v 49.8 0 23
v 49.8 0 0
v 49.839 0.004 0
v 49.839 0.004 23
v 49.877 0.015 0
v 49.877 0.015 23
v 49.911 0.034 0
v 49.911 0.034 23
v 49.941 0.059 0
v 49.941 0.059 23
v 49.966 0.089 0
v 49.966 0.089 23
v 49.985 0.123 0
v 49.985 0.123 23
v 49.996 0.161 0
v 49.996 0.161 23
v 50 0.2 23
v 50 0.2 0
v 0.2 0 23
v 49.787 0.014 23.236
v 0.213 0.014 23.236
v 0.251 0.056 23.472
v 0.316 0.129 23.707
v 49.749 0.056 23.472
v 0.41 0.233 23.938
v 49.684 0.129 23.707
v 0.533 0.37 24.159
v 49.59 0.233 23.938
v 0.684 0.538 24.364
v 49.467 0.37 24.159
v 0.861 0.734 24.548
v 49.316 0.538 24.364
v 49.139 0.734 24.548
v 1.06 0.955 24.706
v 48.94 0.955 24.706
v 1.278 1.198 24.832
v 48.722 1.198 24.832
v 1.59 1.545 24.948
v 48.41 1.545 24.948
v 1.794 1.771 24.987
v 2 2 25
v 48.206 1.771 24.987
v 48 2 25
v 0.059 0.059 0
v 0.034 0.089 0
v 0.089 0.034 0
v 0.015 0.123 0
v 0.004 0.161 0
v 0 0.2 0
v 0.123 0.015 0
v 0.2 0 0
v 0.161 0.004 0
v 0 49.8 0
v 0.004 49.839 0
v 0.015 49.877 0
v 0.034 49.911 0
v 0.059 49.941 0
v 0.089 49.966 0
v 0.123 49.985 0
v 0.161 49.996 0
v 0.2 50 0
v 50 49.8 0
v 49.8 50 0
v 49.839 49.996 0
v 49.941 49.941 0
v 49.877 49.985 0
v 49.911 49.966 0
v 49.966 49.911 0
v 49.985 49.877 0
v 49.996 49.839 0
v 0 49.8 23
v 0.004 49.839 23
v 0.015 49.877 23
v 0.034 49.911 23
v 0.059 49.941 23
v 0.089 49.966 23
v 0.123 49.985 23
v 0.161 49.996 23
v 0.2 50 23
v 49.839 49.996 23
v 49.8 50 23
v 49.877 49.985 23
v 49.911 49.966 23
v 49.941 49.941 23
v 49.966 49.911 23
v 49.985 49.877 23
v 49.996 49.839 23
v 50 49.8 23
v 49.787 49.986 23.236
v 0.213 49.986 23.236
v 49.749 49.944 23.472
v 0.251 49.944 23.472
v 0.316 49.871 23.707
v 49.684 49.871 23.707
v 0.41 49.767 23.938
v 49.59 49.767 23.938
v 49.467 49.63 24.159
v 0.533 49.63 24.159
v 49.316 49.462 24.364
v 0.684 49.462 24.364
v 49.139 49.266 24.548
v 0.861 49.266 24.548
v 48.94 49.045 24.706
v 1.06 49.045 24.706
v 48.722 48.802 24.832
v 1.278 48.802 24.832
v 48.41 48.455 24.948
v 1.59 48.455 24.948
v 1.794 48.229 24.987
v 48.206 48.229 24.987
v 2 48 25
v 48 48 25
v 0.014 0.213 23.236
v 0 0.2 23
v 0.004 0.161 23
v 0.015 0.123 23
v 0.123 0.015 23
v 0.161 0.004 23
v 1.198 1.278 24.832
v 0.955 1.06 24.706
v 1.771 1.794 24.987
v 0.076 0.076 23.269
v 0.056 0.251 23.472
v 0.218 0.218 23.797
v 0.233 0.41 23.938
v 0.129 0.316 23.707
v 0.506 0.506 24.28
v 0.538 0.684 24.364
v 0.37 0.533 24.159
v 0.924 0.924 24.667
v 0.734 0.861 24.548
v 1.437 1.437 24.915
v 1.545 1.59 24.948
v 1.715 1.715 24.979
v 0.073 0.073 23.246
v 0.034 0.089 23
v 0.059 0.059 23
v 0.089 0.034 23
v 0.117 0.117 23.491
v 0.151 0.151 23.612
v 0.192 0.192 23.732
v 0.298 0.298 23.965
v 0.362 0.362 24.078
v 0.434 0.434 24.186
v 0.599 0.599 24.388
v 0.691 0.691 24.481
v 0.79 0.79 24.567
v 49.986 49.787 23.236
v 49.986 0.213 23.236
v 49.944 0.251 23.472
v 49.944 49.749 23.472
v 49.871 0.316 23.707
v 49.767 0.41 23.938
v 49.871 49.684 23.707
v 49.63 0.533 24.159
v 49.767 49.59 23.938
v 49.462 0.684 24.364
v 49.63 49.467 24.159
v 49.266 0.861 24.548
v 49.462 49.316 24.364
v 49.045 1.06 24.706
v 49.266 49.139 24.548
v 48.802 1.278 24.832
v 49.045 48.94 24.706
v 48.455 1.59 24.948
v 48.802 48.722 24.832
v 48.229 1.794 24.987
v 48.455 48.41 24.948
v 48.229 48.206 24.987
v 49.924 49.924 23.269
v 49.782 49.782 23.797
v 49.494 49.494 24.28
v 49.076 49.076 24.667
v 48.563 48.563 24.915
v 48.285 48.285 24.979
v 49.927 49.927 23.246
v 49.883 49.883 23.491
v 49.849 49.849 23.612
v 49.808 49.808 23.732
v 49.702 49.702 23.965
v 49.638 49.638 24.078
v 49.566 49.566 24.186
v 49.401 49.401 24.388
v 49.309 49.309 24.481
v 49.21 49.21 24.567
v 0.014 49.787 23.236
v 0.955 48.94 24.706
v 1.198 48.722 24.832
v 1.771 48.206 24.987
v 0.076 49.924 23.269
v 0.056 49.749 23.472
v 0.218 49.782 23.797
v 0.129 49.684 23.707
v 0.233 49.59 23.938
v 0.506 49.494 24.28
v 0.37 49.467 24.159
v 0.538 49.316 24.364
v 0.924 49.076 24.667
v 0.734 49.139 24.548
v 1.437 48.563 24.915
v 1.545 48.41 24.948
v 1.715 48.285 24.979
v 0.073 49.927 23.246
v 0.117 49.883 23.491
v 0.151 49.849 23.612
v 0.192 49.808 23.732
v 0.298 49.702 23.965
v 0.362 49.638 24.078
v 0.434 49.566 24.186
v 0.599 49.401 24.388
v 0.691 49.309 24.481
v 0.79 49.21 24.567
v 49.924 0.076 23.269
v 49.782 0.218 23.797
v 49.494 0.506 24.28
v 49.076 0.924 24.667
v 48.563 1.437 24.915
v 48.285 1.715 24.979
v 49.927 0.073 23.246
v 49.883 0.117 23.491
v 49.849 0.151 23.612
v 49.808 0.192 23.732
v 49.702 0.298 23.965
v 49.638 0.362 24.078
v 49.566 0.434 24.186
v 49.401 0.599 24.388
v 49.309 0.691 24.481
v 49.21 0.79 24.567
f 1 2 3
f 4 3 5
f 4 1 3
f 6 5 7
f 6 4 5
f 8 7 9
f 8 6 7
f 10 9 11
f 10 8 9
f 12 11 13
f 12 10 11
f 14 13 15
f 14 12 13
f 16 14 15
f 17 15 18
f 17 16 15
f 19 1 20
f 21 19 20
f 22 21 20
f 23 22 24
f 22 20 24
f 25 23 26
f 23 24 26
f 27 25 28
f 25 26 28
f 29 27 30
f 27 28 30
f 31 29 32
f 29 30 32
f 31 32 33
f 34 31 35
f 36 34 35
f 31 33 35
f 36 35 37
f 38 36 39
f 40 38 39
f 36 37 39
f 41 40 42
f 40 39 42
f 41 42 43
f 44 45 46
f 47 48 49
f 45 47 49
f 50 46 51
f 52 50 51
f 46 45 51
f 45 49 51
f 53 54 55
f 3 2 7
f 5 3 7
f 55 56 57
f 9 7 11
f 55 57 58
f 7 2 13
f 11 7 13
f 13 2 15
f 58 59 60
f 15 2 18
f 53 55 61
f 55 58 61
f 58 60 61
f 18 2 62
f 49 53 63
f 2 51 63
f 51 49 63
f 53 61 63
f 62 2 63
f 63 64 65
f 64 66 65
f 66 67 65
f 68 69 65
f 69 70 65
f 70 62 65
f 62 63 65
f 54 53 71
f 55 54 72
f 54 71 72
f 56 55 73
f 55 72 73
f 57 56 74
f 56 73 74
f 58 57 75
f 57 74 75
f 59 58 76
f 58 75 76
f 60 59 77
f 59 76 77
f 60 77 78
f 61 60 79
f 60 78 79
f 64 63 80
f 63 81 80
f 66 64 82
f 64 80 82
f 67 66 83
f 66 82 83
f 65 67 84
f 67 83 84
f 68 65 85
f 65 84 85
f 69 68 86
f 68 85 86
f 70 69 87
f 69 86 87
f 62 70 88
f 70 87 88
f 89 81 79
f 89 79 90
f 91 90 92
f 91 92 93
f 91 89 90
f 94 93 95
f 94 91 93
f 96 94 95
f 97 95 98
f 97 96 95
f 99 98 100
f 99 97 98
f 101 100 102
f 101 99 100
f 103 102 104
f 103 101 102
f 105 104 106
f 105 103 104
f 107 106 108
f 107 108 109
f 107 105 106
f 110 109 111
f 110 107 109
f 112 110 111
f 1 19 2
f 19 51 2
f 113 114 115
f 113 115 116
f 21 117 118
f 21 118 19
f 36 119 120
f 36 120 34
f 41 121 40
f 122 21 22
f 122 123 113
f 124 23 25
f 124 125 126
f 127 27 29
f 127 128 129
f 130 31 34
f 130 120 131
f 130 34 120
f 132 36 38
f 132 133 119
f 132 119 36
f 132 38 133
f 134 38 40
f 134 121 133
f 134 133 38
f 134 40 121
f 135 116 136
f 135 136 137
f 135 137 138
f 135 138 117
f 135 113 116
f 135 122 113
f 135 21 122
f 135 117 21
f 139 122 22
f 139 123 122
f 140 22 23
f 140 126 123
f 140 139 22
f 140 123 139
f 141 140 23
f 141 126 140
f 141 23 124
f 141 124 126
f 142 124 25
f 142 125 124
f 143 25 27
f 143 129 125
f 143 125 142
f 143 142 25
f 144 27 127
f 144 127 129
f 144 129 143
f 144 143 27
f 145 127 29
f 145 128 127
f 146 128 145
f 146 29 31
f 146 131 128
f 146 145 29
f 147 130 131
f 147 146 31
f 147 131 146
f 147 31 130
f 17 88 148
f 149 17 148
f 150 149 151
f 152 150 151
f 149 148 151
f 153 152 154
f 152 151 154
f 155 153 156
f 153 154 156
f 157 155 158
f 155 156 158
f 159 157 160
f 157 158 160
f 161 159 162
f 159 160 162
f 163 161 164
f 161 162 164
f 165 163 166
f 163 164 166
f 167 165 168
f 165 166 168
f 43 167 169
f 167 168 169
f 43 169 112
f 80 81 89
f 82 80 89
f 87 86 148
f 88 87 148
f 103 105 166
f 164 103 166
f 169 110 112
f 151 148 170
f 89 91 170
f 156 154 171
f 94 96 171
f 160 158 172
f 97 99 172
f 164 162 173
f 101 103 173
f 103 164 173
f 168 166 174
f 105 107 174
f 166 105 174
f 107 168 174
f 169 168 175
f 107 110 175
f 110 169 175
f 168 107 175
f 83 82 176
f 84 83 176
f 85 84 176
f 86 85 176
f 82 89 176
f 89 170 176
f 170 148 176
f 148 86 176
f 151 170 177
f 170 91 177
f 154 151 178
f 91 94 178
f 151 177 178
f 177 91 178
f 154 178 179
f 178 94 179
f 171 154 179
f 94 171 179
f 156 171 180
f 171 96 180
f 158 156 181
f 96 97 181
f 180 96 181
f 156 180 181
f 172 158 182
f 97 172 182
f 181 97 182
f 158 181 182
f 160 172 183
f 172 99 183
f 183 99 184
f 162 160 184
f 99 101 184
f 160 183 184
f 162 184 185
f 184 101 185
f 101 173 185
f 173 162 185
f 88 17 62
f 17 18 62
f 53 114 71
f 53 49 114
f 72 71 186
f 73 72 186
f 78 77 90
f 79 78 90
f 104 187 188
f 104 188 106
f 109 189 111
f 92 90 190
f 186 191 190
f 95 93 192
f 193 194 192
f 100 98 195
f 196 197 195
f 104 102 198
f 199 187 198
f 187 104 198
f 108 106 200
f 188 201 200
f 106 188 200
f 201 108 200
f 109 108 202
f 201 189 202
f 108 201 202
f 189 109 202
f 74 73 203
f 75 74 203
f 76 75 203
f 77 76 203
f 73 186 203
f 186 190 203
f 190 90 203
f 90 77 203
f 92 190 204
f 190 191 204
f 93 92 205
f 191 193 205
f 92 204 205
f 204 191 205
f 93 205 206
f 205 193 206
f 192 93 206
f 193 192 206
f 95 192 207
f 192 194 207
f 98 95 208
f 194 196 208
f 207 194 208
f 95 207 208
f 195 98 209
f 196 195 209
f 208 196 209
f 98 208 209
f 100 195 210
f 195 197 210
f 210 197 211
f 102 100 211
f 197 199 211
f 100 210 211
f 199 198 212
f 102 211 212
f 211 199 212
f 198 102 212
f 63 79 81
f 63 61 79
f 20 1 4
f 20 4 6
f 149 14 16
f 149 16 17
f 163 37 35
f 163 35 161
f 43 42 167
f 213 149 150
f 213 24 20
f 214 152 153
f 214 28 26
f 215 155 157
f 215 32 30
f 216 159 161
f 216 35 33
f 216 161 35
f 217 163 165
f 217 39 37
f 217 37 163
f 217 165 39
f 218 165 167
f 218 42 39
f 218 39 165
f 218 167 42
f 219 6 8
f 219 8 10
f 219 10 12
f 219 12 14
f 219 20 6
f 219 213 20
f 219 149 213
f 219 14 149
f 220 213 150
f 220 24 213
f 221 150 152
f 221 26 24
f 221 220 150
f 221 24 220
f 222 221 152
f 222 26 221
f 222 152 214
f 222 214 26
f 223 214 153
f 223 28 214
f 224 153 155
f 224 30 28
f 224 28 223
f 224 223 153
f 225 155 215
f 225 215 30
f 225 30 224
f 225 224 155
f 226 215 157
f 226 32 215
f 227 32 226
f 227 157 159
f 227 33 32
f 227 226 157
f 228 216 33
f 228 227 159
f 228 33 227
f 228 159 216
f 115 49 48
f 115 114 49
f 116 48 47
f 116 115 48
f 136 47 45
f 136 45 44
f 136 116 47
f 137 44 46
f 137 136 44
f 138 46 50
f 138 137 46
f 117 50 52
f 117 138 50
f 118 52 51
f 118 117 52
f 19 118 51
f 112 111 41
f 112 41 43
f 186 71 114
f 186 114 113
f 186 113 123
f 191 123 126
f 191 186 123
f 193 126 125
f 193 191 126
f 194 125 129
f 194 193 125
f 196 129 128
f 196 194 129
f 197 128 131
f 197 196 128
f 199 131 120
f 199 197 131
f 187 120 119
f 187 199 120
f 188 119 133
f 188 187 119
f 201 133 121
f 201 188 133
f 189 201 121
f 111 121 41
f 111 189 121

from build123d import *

# Parameters (mm, degrees)
BOX_W       = 50
BOX_H       = 50
BOX_DEPTH   = 25
FILLET_R    = 2
FILLET001_R = 0.2


with BuildPart() as part:
    # Box → Box (new body)
    with BuildSketch(Plane.XY):
        with Locations((25, 25)):
            Rectangle(BOX_W, BOX_H)
    extrude(amount=BOX_DEPTH)

    # Fillet
    fillet_edges = [part.edges().sort_by_distance(p)[0] for p in [
        (0, 25, 25),
        (25, 0, 25),
        (50, 25, 25),
        (25, 50, 25),
    ]]
    fillet(fillet_edges, radius=FILLET_R)

    # Fillet001
    fillet001_edges = [part.edges().sort_by_distance(p)[0] for p in [
        (0, 0, 11.5),
        (50, 0, 11.5),
        (50, 50, 11.5),
        (0, 50, 11.5),
    ]]
    fillet(fillet001_edges, radius=FILLET001_R)


solid = part.part
